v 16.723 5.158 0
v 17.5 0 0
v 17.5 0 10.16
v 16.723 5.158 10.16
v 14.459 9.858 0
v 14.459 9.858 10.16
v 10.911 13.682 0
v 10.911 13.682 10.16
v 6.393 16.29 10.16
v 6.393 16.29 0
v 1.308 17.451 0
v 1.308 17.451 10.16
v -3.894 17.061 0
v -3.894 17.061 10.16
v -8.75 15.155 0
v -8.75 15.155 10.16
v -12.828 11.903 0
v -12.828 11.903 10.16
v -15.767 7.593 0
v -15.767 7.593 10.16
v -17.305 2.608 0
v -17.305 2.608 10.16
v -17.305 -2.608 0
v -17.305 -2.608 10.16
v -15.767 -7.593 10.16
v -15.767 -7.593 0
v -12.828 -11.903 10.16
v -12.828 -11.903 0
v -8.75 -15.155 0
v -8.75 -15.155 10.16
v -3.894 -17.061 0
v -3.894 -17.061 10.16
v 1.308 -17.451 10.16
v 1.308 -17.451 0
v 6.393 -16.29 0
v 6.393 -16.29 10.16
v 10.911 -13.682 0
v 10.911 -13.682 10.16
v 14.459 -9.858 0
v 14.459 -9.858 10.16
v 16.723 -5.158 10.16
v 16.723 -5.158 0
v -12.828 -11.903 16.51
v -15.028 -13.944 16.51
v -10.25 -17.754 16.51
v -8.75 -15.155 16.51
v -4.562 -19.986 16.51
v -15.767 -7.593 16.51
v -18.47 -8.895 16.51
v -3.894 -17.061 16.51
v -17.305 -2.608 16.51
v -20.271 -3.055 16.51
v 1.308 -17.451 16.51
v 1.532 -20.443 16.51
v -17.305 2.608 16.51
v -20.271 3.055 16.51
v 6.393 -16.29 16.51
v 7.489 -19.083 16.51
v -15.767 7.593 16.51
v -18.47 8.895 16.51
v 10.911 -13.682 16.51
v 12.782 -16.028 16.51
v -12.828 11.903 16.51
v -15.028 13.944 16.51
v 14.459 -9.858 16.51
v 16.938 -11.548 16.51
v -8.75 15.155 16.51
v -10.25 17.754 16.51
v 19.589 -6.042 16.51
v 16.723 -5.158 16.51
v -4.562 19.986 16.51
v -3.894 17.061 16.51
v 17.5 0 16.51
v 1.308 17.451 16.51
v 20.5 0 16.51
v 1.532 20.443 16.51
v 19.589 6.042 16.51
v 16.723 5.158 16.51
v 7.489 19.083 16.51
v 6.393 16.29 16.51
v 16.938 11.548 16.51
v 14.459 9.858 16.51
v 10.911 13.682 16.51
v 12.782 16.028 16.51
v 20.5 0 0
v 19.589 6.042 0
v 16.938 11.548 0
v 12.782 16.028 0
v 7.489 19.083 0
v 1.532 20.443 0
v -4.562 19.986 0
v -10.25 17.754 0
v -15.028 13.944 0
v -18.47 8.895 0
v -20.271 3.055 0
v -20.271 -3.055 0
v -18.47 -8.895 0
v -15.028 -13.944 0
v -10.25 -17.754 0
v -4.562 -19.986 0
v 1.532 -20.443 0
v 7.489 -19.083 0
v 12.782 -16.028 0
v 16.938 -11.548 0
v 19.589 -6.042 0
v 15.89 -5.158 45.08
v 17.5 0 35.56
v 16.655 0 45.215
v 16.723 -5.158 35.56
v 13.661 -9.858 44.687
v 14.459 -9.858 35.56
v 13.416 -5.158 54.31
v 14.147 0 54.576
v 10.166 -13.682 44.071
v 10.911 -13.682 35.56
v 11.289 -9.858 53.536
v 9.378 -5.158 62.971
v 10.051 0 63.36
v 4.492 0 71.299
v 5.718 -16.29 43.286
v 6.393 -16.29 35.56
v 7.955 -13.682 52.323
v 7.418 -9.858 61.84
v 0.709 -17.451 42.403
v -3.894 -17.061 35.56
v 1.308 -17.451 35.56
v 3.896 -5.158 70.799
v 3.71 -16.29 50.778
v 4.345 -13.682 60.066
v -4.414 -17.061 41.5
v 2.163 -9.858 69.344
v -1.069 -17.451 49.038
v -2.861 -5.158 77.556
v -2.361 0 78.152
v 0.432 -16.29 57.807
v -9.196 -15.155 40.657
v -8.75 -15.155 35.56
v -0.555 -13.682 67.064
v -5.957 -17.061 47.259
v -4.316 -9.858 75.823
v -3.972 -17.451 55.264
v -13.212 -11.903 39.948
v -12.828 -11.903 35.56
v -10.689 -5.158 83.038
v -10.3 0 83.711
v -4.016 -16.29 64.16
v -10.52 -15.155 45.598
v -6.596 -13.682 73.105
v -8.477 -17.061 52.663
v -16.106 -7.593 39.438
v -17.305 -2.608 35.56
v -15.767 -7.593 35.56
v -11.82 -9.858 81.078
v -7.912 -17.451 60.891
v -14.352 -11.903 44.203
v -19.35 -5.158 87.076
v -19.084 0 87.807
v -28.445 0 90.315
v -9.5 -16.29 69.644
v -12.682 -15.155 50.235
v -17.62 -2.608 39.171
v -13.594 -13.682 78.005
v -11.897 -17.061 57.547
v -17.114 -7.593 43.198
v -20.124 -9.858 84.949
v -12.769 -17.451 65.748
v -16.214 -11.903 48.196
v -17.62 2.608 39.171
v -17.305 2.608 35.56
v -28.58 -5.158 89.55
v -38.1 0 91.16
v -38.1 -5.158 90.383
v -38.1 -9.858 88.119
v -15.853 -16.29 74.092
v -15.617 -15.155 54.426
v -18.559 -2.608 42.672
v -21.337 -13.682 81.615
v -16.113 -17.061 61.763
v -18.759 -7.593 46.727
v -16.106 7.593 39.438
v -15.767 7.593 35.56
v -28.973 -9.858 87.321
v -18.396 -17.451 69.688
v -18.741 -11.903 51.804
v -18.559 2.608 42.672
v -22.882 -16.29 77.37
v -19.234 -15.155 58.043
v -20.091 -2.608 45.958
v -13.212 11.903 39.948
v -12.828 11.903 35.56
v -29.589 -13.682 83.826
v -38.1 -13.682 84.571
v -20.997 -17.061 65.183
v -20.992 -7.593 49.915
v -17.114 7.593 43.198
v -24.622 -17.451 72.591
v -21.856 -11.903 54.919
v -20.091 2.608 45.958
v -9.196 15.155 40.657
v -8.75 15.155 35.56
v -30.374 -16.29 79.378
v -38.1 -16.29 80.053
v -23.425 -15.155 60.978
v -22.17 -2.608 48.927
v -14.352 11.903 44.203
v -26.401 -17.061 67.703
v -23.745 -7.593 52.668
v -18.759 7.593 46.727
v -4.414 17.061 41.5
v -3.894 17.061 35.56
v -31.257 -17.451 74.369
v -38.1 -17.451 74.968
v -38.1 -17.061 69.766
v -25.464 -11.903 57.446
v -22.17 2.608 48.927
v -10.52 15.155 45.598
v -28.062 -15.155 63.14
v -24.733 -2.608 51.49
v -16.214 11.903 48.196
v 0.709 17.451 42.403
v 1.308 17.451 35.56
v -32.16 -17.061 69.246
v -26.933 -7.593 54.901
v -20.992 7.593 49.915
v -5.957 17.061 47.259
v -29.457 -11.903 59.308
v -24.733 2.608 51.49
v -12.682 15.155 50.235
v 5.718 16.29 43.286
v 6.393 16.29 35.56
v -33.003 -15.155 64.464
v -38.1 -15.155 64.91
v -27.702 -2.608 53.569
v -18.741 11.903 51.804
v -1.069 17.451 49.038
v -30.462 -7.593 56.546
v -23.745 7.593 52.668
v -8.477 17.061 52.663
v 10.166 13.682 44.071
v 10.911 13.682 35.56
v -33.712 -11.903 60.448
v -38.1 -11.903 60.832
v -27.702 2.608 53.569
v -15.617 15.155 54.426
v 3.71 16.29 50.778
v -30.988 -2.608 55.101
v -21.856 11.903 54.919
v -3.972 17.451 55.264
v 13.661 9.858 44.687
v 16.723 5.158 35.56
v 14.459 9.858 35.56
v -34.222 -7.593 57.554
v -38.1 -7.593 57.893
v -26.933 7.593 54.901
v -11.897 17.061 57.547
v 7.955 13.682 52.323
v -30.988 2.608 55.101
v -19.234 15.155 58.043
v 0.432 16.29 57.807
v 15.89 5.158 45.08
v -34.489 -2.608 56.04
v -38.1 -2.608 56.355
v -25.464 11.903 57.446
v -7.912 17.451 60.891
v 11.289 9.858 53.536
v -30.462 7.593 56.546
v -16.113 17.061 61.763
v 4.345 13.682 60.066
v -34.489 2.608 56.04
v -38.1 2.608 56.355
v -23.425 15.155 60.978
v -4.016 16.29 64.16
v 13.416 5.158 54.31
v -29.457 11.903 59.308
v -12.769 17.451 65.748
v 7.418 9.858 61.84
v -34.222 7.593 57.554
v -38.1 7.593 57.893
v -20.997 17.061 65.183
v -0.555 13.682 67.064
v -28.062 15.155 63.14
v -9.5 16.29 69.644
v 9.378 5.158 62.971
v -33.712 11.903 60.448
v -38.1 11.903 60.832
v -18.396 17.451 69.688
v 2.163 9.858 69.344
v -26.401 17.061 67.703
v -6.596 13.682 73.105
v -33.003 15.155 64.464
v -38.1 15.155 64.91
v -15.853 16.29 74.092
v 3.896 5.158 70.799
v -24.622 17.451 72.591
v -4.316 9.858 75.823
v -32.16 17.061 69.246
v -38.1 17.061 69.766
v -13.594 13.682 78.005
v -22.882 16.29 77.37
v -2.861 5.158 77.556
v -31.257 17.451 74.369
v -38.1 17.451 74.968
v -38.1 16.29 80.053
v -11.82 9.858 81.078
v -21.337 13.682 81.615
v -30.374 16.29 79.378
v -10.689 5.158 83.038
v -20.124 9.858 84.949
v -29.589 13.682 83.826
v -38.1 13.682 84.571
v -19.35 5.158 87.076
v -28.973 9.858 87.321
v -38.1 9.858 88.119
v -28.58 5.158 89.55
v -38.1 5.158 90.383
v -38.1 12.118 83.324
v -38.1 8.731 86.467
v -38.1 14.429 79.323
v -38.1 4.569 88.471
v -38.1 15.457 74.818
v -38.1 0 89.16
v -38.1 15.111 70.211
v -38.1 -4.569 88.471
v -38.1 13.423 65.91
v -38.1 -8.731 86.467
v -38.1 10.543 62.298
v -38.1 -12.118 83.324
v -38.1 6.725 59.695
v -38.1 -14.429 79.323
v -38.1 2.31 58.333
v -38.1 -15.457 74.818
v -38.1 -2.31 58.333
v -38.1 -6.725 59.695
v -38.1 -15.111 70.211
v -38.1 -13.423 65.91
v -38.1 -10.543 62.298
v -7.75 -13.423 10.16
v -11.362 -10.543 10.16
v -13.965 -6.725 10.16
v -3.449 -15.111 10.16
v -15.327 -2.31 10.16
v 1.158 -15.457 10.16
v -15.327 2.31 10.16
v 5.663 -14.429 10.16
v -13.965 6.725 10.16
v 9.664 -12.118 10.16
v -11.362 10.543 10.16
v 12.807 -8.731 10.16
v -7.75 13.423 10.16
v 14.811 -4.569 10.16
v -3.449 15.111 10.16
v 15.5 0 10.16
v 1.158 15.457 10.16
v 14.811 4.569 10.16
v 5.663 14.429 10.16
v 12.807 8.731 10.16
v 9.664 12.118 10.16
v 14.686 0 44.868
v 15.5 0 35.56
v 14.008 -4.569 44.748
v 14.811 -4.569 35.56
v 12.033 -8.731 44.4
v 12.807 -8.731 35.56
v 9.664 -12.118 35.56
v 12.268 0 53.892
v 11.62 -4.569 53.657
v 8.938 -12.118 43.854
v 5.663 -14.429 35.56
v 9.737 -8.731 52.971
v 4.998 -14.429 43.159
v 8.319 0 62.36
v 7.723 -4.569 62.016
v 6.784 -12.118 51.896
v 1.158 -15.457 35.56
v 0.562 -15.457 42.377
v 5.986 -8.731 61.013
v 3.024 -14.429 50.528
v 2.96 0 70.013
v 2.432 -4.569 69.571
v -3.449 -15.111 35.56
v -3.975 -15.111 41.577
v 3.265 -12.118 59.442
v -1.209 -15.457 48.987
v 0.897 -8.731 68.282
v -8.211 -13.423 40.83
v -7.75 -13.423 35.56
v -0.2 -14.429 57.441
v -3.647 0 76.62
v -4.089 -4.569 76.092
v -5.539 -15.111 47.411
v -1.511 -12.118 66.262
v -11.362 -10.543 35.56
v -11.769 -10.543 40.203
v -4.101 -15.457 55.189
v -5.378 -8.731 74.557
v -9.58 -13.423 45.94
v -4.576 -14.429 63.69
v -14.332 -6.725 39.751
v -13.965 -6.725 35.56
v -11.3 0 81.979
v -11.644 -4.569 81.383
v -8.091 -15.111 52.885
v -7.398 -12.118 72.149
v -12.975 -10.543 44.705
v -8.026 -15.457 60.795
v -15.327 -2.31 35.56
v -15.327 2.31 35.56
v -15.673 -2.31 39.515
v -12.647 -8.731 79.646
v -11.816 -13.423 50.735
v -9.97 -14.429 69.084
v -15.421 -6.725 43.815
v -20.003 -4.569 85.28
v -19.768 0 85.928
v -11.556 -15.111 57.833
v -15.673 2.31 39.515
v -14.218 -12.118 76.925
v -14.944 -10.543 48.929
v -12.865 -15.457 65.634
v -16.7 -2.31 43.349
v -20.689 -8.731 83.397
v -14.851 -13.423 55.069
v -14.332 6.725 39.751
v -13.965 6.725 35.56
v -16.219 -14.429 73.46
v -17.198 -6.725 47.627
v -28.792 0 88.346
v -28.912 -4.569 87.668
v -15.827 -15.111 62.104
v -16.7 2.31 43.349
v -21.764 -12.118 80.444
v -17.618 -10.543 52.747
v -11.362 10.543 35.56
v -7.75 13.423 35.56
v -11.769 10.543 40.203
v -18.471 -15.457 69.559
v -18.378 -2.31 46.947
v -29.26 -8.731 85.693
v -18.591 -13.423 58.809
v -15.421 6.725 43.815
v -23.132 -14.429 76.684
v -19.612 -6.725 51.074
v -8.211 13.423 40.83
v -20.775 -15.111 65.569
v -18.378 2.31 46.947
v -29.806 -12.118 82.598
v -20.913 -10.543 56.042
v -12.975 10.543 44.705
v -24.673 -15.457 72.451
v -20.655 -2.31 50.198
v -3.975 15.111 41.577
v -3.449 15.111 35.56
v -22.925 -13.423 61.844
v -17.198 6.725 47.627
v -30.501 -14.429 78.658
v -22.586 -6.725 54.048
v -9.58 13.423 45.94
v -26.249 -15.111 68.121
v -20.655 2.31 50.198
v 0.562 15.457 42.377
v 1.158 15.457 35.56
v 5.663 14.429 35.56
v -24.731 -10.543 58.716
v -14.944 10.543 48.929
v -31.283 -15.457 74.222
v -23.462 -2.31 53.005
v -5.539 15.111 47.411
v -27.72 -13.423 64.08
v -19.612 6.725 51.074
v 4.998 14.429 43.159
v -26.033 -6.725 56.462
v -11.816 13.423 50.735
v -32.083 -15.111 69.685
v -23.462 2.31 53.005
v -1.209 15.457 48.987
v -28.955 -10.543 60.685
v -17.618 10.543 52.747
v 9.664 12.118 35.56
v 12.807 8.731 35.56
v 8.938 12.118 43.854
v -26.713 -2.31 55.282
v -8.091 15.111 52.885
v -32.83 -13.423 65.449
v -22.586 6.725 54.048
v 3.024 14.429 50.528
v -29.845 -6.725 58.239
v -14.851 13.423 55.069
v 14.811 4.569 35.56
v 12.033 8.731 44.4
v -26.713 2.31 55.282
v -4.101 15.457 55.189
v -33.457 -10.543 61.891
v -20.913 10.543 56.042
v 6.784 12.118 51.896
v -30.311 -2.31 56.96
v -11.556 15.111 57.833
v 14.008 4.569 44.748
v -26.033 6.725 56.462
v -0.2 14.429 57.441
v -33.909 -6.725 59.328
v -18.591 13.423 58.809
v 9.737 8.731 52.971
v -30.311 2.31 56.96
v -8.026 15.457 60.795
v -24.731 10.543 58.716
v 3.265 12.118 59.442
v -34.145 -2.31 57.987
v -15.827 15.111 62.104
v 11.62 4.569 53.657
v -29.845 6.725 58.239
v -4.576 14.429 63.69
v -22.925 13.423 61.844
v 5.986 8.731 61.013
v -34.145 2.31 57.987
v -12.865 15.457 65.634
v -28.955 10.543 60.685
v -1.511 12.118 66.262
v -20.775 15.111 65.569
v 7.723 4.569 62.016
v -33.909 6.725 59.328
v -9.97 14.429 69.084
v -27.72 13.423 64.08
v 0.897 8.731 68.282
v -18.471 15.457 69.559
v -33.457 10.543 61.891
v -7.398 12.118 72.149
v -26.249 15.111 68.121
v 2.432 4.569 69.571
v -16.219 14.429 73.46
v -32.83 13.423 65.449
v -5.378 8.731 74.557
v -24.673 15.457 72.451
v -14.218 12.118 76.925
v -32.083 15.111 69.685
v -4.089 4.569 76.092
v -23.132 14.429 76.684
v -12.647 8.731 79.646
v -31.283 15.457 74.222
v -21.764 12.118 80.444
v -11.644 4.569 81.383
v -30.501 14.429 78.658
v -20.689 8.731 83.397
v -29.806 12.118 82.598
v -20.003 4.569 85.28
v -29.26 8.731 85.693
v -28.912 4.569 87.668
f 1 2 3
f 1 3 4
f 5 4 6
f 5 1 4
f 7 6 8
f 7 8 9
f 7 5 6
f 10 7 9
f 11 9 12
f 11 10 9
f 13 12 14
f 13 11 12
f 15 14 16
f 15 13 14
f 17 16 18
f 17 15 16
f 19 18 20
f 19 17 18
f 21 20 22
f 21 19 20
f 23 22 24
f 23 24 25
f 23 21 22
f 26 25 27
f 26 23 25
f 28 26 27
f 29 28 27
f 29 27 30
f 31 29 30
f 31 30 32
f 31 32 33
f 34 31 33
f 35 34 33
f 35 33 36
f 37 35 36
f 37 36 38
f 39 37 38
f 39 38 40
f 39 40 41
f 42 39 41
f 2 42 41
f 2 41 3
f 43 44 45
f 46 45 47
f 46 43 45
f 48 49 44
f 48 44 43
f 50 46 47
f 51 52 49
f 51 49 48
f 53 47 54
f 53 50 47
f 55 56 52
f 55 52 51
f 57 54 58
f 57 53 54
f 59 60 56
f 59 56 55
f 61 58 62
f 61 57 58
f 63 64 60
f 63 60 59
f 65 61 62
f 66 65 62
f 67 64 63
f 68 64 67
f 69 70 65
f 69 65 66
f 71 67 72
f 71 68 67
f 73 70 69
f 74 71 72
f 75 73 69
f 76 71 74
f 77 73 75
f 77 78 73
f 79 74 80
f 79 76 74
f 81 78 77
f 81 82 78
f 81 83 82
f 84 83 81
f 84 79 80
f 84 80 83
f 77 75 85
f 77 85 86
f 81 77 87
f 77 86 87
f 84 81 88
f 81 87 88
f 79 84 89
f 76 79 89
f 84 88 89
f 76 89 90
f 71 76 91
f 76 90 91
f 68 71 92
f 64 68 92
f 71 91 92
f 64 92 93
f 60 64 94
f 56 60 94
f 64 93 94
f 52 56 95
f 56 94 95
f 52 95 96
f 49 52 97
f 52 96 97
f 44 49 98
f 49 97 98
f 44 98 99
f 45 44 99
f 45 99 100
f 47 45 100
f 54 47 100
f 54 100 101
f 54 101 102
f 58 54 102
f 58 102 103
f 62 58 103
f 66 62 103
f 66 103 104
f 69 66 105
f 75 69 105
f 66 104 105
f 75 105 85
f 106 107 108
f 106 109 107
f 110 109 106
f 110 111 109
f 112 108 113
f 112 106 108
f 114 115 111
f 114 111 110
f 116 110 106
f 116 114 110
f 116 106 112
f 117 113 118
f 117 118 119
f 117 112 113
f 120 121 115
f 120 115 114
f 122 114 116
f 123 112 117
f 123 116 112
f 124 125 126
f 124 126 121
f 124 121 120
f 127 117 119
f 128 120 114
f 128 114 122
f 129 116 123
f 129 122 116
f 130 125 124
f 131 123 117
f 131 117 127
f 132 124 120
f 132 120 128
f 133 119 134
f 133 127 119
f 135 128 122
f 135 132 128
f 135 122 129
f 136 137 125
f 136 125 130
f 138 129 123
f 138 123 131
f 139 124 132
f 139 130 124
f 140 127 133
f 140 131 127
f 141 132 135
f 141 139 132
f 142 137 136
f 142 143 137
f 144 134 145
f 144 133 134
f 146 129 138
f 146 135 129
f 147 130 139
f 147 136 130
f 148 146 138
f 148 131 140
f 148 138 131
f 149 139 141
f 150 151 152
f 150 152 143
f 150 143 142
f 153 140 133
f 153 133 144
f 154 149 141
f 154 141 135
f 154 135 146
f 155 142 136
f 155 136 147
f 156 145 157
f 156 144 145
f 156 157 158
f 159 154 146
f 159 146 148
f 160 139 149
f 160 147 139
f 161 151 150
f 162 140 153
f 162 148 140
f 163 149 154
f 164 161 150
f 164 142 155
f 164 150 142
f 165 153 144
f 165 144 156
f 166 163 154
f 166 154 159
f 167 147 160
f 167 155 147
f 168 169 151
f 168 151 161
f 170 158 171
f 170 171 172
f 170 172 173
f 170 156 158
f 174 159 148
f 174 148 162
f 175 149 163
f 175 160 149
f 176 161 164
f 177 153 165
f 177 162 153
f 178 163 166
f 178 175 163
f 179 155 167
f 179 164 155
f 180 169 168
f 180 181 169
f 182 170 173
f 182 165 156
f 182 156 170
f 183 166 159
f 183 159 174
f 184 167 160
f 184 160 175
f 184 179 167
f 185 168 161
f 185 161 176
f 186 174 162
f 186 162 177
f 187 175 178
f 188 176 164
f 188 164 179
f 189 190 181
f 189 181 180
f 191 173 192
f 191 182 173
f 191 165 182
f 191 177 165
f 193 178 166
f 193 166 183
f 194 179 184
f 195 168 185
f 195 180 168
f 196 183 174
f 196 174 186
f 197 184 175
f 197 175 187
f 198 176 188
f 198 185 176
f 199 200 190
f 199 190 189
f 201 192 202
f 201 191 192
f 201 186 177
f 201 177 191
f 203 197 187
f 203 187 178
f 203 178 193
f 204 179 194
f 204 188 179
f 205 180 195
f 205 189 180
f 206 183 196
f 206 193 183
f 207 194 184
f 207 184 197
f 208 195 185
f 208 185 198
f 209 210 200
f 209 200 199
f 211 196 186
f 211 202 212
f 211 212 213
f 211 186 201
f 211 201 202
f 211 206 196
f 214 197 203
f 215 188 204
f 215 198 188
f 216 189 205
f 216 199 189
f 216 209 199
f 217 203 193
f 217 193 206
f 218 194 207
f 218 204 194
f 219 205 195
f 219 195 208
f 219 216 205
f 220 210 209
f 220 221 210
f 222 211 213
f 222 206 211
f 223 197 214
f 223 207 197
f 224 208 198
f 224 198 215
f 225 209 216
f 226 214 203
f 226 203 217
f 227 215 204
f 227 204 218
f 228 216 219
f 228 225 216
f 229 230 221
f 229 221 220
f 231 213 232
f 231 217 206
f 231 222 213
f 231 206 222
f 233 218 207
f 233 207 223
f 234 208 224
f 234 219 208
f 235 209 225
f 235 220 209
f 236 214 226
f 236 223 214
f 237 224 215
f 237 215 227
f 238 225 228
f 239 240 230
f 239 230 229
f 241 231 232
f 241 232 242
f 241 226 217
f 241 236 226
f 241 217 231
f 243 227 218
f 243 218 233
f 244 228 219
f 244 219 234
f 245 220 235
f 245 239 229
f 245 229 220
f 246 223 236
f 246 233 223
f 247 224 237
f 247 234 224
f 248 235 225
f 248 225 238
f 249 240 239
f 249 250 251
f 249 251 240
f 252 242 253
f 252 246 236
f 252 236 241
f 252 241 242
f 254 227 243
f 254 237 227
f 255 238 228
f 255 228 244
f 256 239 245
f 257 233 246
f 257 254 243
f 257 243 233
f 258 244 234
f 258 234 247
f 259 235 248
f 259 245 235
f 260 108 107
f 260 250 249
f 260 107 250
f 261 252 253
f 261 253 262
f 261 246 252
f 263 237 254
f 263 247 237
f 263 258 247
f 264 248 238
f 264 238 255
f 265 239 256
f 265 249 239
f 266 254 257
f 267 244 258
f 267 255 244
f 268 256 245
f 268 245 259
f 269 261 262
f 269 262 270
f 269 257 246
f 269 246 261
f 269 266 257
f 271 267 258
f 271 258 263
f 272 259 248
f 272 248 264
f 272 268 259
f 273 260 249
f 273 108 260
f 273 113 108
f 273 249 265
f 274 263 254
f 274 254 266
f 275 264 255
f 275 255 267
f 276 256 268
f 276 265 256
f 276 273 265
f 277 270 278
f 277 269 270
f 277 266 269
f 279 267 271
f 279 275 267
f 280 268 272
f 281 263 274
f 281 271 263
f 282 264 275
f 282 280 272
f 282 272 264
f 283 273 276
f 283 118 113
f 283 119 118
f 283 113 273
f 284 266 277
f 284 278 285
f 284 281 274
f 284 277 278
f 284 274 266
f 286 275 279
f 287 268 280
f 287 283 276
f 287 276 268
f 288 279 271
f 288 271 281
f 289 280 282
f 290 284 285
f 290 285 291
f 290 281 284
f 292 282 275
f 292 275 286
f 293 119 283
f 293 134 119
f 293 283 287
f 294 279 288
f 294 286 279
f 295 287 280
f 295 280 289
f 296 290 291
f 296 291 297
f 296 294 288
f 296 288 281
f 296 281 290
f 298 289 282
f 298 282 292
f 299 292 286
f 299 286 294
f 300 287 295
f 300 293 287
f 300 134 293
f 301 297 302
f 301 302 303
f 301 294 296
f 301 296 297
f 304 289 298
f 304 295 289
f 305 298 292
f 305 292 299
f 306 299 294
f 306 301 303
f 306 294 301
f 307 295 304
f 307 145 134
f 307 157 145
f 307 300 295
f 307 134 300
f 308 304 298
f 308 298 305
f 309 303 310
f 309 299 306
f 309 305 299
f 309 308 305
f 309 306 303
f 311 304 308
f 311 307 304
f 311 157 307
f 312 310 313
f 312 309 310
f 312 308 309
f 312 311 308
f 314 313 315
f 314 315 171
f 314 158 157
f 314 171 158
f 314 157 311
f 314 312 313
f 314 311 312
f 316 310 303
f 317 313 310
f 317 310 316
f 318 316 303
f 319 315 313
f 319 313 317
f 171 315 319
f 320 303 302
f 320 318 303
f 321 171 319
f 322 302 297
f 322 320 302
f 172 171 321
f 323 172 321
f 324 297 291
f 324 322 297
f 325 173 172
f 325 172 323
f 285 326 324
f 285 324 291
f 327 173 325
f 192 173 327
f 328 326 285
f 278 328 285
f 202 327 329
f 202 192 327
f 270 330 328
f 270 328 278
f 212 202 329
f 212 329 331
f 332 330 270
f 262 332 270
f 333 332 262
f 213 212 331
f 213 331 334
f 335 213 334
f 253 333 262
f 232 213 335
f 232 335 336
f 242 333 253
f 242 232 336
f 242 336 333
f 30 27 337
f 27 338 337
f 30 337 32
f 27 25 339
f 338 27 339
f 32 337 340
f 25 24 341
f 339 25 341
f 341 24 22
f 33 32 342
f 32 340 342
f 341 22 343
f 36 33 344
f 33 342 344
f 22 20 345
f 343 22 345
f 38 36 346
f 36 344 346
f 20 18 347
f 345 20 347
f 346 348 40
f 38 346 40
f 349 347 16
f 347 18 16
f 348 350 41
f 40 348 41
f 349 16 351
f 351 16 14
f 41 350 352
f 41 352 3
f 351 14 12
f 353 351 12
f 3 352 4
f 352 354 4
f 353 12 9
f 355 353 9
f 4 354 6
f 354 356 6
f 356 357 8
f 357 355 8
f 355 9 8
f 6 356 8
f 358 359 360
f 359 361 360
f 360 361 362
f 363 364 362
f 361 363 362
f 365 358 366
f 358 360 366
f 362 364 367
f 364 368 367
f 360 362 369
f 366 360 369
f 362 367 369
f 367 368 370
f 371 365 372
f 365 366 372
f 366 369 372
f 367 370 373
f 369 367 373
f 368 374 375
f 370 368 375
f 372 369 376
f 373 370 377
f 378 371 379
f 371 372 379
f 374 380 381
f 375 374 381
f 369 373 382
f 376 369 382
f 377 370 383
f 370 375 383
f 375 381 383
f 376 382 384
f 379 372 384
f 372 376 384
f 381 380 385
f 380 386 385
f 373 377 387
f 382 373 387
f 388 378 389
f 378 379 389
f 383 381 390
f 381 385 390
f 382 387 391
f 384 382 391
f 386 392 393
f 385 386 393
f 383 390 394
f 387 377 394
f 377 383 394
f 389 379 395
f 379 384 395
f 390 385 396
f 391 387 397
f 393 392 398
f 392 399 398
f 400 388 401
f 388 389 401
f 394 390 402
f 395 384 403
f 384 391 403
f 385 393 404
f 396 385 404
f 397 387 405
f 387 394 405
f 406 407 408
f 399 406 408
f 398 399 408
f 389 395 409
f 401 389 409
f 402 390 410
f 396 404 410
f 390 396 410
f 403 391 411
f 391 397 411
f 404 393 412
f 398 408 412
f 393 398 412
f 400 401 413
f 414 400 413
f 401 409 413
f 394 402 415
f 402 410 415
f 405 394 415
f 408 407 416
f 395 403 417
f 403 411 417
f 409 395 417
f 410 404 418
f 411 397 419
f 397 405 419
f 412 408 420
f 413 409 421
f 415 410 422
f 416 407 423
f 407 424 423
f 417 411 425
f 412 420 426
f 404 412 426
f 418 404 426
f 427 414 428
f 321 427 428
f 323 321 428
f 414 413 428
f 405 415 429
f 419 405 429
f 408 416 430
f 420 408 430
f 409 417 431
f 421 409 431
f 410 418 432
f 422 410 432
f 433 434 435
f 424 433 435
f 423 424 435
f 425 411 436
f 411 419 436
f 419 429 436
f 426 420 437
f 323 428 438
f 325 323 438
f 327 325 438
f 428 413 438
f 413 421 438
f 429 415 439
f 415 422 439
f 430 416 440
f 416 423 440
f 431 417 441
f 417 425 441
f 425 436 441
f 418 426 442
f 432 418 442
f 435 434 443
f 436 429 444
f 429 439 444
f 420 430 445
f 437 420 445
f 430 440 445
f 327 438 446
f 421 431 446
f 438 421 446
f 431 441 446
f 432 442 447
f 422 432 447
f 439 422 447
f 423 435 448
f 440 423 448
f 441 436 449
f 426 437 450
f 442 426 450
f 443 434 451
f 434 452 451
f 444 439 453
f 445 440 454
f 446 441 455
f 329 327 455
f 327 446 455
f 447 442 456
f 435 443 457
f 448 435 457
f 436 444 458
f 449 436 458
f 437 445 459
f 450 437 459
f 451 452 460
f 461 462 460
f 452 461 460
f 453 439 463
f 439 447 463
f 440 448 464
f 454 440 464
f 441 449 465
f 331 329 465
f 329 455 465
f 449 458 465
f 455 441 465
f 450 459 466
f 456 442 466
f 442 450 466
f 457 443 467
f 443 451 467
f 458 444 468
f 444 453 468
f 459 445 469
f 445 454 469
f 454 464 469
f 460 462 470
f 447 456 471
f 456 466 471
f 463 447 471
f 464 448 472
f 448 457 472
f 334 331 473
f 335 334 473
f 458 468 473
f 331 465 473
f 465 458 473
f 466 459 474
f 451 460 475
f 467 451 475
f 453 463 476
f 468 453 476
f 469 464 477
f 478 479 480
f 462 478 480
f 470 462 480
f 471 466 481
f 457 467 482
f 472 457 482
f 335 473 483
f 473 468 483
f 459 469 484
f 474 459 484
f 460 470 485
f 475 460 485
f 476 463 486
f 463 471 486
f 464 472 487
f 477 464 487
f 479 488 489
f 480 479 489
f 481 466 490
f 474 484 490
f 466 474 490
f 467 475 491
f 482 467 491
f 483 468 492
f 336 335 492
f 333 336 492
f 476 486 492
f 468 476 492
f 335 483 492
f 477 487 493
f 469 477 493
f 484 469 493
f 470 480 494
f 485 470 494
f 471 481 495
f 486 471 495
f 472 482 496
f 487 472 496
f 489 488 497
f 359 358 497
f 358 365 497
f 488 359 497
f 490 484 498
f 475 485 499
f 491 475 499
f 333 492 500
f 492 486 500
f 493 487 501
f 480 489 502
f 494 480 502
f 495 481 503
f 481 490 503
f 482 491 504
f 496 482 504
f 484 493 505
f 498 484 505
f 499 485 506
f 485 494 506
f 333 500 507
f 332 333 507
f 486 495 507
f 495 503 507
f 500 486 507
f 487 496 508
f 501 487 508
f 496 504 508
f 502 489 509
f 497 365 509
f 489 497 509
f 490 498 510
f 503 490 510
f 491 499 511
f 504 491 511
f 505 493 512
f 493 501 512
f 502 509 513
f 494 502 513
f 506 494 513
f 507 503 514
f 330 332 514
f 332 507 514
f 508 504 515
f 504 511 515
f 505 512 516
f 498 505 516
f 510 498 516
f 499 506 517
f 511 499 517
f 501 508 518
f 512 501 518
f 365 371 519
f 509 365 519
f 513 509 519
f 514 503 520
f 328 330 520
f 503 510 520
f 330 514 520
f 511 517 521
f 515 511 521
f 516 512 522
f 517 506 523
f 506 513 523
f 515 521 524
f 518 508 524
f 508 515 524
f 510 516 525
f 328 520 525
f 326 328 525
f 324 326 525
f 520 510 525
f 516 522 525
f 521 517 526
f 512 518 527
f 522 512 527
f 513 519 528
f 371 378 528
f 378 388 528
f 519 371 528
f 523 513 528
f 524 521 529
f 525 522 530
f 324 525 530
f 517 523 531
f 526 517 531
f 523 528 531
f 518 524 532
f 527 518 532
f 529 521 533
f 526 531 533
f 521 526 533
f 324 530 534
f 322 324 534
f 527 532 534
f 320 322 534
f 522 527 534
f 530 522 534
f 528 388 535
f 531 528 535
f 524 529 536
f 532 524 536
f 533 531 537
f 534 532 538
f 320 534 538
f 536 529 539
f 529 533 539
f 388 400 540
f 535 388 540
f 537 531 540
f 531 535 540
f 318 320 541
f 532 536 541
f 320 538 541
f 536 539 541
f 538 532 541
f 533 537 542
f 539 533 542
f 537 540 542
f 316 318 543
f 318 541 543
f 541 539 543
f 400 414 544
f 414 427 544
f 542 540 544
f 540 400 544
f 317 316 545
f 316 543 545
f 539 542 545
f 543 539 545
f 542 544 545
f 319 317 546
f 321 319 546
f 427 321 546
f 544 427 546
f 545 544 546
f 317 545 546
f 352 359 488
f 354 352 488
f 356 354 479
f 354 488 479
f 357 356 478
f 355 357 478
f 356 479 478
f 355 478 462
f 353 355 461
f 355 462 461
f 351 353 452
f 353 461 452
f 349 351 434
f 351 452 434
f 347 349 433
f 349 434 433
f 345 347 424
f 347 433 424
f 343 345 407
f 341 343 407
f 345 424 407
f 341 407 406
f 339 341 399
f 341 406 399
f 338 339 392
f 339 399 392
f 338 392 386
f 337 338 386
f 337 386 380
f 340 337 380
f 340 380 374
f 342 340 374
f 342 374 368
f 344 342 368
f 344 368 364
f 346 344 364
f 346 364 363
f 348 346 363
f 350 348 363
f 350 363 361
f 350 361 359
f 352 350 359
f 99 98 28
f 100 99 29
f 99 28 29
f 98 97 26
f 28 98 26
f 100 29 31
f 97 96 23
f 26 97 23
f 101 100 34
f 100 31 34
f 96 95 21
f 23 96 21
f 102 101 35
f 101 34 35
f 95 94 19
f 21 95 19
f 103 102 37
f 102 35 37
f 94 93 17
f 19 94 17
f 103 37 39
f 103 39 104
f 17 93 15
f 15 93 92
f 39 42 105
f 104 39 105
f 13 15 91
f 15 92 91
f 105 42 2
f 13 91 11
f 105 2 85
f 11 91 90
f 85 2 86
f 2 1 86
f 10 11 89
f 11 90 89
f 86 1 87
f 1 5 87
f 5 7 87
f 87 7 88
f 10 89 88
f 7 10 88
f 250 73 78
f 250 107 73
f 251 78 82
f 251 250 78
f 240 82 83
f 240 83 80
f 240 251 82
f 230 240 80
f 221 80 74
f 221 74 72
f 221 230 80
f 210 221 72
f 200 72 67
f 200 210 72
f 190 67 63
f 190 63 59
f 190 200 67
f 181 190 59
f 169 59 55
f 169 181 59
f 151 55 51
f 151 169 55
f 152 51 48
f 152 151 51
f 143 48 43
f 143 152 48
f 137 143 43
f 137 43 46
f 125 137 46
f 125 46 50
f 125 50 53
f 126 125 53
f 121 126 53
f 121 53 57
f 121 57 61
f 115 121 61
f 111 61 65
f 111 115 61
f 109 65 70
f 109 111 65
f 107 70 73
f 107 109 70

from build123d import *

# Parameters (mm, degrees)
SKETCH1_R           = 20.5
SKETCH1_R_2         = 17.5
BOSS_EXTRUDE1_DEPTH = 16.51
SKETCH4_R           = 17.5
SKETCH4_R_2         = 15.5


with BuildPart() as part:
    # Sketch1 → Boss-Extrude1 (new body)
    with BuildSketch(Plane.XY):
        Circle(SKETCH1_R)
        Circle(SKETCH1_R_2, mode=Mode.SUBTRACT)
    extrude(amount=BOSS_EXTRUDE1_DEPTH)

    # Sweep3: sweep along a path in Sketch5
    with BuildLine(Plane(origin=(0, 0, 0), x_dir=(1, 0, 0), z_dir=(0, 1, 0))) as sweep3_path:
        Line((0, -10.16), (0, -35.56))
        ThreePointArc((0, -35.56), (-11.159231637, -62.500768363), (-38.1, -73.66))
    # Sketch4 → Sweep3 (sweep)
    with BuildSketch(Plane.XY.offset(10.16)):
        Circle(SKETCH4_R)
        Circle(SKETCH4_R_2, mode=Mode.SUBTRACT)
    sweep(path=sweep3_path.line)


solid = part.part
